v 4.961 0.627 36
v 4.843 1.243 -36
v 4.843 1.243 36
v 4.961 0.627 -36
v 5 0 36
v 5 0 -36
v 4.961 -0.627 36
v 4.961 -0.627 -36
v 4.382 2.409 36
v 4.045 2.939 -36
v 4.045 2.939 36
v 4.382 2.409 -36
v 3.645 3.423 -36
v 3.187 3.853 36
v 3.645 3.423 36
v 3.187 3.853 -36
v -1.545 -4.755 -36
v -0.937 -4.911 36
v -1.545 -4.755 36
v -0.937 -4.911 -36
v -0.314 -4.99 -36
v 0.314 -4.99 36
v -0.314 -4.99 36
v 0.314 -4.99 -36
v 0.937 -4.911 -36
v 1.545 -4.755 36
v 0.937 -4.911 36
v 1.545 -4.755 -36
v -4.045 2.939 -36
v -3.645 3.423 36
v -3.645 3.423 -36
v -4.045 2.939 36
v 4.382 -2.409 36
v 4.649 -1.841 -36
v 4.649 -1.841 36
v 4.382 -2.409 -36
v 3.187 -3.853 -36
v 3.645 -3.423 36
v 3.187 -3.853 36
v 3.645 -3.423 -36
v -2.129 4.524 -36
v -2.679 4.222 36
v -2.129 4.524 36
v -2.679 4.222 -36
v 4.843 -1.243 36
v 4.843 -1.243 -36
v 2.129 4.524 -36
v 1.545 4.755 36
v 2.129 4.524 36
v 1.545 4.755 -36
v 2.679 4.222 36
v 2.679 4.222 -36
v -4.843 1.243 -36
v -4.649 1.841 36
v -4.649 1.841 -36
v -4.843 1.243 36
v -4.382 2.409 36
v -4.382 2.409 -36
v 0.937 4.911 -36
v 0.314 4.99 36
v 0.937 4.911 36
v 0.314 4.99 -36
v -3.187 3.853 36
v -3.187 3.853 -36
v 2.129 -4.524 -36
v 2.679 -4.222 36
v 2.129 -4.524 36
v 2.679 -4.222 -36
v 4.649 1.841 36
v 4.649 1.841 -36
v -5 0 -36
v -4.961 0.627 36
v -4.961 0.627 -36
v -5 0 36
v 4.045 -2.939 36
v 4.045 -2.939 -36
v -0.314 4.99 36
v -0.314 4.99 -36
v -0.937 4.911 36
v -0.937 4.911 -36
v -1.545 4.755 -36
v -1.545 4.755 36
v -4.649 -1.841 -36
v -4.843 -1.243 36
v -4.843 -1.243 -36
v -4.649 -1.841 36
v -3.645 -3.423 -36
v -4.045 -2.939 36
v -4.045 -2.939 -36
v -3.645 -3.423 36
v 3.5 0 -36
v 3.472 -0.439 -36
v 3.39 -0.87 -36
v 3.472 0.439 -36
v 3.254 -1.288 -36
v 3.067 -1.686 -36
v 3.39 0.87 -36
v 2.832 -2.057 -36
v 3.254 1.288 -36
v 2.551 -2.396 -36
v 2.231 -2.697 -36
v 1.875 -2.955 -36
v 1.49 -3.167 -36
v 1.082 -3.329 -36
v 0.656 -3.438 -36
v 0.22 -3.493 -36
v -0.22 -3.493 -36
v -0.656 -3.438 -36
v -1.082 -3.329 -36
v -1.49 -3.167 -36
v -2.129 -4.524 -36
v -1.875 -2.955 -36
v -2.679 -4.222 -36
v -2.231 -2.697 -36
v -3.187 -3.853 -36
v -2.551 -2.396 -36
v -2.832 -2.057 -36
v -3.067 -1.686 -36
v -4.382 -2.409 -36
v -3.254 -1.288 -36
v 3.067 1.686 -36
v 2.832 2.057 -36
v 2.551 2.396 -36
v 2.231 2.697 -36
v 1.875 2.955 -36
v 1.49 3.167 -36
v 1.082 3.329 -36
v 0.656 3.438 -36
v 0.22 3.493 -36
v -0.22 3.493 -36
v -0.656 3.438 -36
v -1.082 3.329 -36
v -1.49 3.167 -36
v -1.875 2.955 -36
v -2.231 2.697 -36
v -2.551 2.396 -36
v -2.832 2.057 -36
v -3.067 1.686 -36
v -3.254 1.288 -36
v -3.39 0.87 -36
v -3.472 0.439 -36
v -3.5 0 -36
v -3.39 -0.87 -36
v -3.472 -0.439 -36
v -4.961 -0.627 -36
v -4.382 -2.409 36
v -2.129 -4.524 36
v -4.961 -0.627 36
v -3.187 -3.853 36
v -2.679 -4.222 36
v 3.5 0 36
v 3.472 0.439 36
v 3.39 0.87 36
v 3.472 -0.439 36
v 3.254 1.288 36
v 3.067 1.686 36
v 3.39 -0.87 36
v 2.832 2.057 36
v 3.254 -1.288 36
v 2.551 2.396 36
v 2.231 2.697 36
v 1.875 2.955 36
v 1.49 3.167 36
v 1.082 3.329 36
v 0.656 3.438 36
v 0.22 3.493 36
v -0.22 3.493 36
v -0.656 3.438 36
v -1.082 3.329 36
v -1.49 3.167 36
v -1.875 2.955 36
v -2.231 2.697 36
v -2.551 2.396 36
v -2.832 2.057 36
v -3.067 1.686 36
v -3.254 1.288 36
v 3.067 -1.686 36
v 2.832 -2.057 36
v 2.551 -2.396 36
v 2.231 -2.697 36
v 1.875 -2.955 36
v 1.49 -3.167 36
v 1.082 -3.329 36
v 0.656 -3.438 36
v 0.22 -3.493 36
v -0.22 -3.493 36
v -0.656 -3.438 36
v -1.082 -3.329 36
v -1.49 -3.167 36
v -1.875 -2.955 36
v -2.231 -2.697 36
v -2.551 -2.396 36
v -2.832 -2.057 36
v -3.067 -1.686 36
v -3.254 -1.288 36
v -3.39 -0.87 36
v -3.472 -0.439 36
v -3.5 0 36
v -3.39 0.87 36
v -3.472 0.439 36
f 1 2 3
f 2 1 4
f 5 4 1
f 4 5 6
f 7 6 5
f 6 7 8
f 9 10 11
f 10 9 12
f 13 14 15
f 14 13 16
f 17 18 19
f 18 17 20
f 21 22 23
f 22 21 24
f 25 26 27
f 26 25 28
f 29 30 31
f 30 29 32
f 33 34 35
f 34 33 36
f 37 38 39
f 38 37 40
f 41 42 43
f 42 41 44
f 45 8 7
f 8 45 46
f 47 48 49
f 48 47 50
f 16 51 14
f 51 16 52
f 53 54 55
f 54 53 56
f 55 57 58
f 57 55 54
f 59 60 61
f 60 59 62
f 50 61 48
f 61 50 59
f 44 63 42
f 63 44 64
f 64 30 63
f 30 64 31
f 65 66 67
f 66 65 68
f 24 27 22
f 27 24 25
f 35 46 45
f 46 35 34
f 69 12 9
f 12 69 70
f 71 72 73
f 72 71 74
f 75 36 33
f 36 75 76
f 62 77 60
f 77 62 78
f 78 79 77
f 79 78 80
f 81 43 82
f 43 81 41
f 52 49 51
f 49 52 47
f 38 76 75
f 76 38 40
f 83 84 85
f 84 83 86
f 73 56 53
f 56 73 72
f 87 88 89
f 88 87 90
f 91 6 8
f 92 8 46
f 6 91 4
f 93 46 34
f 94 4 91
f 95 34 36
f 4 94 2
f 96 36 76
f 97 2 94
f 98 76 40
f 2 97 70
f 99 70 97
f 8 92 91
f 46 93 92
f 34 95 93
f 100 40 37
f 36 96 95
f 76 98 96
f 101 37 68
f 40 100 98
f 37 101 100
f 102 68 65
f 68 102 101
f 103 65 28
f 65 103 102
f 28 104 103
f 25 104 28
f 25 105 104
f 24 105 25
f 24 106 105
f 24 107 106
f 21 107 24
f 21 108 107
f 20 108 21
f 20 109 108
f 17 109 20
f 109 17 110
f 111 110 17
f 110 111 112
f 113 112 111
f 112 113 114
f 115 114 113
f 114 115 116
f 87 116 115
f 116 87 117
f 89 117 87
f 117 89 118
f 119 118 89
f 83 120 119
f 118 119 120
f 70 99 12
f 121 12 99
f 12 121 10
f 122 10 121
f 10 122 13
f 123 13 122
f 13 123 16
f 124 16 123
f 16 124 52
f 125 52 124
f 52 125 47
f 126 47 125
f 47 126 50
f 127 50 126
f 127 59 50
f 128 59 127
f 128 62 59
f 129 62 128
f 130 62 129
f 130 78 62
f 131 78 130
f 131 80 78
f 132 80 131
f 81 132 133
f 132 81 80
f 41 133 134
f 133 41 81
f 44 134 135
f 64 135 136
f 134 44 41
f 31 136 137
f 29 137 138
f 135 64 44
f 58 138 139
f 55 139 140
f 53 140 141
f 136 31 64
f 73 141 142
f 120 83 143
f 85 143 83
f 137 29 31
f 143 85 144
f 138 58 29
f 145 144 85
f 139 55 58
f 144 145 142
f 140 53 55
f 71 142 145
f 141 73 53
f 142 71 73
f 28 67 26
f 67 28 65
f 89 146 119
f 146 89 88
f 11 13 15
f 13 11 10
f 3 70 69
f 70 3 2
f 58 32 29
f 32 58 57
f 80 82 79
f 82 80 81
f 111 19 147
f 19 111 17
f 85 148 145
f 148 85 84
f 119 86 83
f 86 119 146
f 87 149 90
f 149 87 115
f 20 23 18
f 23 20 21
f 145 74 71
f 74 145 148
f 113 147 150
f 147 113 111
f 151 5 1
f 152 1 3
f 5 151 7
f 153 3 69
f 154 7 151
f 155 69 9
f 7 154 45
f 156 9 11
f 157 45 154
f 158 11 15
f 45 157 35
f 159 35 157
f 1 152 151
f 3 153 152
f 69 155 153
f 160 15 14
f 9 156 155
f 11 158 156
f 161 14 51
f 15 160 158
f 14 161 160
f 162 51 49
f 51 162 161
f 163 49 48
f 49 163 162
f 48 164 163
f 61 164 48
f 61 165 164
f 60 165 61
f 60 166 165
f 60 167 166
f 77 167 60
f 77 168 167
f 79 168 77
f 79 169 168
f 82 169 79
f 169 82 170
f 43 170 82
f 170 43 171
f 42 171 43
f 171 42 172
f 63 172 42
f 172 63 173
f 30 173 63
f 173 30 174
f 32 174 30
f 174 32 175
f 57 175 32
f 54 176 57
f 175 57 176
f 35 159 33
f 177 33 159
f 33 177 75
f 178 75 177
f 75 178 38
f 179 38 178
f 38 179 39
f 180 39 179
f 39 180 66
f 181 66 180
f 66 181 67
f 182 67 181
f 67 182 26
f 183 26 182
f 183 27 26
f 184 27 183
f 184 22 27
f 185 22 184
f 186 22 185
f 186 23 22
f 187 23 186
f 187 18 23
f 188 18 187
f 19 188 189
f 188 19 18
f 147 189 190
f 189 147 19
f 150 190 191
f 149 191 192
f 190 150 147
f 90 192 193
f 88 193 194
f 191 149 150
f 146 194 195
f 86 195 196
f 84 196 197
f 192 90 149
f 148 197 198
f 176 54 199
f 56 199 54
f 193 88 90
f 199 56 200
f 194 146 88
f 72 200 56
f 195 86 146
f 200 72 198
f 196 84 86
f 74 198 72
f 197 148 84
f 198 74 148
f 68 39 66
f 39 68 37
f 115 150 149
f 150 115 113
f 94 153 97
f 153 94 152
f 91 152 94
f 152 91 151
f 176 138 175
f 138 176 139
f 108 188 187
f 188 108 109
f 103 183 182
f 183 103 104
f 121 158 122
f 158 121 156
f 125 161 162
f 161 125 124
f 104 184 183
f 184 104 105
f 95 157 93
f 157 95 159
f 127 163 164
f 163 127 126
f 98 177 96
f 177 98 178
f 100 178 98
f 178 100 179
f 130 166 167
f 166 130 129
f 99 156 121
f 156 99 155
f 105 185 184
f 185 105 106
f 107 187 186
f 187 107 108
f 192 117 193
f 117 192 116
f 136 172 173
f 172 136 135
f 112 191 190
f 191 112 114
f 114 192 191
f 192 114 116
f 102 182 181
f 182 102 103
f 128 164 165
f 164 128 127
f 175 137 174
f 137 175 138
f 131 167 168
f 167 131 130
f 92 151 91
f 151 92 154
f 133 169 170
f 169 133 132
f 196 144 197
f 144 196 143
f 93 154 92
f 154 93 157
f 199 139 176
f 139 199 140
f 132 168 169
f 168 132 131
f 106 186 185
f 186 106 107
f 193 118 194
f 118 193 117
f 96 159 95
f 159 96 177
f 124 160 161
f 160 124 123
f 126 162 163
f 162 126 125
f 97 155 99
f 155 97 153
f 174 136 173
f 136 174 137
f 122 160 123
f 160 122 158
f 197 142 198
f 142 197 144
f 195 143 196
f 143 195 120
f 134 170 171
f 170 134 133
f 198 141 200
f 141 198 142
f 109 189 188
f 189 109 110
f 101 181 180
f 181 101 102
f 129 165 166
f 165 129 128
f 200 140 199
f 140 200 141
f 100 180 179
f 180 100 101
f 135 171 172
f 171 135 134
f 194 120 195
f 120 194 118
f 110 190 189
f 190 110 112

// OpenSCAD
$fn = 50;


difference() {
	union() {
		translate(v = [0, 0, -36.0000000000]) {
			cylinder(h = 72, r = 5.0000000000);
		}
	}
	union() {
		translate(v = [0, 0, -100.0000000000]) {
			cylinder(h = 200, r = 3.5000000000);
		}
	}
}
